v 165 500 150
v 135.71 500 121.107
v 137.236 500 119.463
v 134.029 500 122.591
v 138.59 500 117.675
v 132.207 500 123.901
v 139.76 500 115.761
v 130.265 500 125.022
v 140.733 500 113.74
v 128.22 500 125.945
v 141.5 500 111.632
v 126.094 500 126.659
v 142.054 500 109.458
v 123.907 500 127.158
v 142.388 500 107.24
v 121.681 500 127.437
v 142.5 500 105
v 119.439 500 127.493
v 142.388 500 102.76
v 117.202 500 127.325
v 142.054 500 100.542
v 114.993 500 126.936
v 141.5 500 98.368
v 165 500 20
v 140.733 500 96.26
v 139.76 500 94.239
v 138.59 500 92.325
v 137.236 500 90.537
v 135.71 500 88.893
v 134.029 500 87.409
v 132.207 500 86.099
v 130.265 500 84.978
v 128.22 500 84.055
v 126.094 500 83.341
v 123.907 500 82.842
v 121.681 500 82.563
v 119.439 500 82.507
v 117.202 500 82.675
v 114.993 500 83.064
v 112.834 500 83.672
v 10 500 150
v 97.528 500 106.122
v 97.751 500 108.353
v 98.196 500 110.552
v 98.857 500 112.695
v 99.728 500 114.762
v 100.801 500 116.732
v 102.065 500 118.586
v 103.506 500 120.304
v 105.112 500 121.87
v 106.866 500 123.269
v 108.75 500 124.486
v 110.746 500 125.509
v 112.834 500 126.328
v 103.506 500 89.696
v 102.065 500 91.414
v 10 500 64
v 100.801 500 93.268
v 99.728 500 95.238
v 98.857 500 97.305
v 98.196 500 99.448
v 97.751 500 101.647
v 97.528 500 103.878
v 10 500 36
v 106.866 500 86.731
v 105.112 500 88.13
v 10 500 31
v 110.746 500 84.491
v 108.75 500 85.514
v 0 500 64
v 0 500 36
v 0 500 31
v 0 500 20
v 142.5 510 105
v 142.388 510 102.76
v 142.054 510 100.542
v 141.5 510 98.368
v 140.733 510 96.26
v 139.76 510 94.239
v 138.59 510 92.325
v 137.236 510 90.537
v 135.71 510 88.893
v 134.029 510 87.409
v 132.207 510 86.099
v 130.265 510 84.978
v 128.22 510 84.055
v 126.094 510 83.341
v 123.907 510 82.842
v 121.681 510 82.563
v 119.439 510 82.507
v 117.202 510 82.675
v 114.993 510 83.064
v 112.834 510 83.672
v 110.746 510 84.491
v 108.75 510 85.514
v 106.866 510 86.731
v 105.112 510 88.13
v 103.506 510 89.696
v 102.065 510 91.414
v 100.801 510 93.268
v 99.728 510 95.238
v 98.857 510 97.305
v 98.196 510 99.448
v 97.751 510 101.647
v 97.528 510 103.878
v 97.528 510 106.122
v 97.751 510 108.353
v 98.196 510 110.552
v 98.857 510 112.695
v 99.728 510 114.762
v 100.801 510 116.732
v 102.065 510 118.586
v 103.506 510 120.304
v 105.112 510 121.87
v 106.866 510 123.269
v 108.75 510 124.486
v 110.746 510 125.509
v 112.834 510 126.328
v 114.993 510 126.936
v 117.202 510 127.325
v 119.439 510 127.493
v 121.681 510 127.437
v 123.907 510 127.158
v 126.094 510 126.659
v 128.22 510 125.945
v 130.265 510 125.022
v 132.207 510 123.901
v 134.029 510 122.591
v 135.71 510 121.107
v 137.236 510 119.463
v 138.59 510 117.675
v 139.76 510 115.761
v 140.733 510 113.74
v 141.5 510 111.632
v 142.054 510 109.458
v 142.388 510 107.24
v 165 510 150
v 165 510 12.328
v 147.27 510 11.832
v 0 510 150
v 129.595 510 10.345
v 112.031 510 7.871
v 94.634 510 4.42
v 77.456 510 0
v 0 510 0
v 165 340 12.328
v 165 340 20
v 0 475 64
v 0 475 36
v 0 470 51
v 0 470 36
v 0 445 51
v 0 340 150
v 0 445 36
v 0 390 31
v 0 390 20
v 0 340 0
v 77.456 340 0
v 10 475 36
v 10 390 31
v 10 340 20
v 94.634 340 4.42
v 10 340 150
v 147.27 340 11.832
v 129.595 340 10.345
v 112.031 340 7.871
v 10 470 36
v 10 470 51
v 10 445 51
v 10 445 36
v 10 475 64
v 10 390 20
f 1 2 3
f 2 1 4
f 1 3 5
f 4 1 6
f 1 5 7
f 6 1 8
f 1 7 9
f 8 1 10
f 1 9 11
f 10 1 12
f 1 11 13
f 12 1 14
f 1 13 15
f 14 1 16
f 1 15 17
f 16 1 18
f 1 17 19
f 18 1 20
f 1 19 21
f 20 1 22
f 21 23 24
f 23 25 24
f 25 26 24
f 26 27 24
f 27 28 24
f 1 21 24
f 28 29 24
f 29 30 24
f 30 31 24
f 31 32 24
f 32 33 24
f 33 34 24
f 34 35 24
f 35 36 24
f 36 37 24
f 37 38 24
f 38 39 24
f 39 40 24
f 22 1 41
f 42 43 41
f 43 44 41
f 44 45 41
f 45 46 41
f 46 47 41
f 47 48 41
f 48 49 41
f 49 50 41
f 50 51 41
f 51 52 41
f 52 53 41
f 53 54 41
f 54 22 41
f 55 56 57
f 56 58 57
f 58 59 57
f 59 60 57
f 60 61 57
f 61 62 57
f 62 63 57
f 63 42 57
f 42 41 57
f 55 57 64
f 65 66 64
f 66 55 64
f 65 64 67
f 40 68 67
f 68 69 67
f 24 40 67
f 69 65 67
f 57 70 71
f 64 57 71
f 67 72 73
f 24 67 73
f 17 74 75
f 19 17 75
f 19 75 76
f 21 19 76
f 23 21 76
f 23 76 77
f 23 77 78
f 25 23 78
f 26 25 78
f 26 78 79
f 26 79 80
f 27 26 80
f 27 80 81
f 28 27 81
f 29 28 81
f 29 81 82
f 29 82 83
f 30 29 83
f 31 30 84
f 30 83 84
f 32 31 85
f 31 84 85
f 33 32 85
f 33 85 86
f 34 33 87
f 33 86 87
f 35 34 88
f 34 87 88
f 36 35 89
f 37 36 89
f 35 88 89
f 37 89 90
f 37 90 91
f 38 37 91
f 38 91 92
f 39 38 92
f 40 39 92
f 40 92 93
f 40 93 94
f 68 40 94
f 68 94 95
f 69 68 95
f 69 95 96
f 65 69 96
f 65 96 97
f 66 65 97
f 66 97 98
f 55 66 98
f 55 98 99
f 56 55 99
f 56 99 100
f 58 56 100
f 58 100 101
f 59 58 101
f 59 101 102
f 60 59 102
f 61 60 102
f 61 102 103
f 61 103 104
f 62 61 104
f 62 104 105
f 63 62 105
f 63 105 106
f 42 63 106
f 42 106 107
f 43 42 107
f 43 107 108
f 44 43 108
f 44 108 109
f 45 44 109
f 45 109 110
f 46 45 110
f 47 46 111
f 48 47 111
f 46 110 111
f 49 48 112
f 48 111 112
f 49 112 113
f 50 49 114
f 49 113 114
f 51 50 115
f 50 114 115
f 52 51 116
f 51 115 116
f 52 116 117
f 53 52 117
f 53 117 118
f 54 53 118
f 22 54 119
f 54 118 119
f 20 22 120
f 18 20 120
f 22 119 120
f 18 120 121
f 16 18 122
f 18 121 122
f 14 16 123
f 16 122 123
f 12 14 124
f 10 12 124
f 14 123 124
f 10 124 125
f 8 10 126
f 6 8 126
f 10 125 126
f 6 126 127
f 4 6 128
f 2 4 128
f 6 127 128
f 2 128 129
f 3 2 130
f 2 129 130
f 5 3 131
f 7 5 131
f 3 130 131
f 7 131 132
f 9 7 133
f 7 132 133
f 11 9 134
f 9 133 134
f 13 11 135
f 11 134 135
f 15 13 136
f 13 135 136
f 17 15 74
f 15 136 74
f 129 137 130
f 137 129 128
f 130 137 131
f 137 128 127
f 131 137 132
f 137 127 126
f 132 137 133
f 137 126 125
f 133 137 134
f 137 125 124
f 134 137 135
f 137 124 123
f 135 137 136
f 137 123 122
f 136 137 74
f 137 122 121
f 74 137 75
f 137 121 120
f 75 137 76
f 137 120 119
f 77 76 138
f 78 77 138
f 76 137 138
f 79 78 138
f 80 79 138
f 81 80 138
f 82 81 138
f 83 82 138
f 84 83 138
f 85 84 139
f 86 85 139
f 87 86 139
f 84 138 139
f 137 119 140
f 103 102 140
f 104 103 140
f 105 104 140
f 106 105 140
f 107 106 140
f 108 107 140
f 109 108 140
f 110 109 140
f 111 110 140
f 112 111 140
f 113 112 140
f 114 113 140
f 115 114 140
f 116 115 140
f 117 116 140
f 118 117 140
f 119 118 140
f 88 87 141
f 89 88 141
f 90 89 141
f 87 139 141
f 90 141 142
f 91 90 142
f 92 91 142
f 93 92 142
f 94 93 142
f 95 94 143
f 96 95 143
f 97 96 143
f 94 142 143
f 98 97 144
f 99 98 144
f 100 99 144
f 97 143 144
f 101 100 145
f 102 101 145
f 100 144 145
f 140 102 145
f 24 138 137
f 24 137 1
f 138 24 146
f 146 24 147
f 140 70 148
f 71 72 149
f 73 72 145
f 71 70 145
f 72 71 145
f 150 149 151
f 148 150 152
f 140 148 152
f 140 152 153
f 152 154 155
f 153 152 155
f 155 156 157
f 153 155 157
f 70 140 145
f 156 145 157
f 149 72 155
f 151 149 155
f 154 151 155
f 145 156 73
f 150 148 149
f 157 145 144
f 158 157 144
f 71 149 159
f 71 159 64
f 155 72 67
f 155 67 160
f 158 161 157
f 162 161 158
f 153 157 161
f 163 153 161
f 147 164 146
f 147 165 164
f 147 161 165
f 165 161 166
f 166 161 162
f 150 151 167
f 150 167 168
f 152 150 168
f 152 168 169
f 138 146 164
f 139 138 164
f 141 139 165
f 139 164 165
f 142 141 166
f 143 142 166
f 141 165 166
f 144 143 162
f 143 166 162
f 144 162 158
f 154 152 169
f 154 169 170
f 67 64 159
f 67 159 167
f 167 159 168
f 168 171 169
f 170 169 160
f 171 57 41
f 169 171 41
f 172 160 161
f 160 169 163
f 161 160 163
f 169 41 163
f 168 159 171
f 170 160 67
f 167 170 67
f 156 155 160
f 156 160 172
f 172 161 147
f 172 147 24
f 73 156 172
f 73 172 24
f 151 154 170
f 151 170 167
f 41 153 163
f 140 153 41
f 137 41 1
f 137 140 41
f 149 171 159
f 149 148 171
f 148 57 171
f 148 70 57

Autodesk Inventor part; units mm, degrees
ref_plane "YZ Plane" through (0, 0, 0) normal (1, 0, 0) x (0, 1, 0)
ref_plane "XZ Plane" through (0, 0, 0) normal (0, 1, 0) x (-1, 0, 0)
ref_plane "XY Plane" through (0, 0, 0) normal (0, 0, 1) x (1, 0, 0)
sketch "Sketch1" plane through (0, 0, 0) normal (0, 0, 1) x (1, 0, 0)
  line L0 (0, 0) -> (330, 0)
  line L1 (330, 0) -> (330, 510)
  line L2 (330, 510) -> (0, 510)
  line L3 (0, 510) -> (0, 0)
  dimension "d0" = 330
  dimension "d1" = 510
extrude "Extrusion1" add sketch "Sketch1" along normal blind 150
sketch "Sketch2" plane through (0, 0, 0) normal (0, -1, 0) x (1, 0, 0)
  circle A0 centre (165, -304.672) radius 315
  line L0 (85, 0) -> (245, 0)
  line L1 (0, 0) -> (330, 0)
  circle A1 centre (165, -304.672) radius 317
  point P0 (165, 0)
  point P1 (165, 0)
  dimension "d4" = 630
  dimension "d8" = 160
  dimension "d9" = 2
extrude "Extrusion2" cut sketch "Sketch2" against normal through all
sketch "Sketch3" plane through (0, 0, 150) normal (0, 0, 1) x (1, 0, 0)
  line L0 (0, 0) -> (330, 0)
  line L1 (330, 0) -> (330, 510)
  line L2 (330, 510) -> (0, 510)
  line L3 (0, 510) -> (0, 0)
  line L4 (10, 10) -> (320, 10)
  line L5 (320, 10) -> (320, 500)
  line L6 (320, 500) -> (10, 500)
  line L7 (10, 500) -> (10, 10)
  dimension "d10" = 10
extrude "Extrusion3" cut sketch "Sketch3" against normal blind 130 contours L7 L6 L5 L4
sketch "Sketch4" plane through (0, 0, 20) normal (0, 0, 1) x (1, 0, 0)
  line L0 (10, 500) -> (320, 500) construction
  line L1 (85, 500) -> (245, 500) construction
  line L2 (245, 500) -> (245, 10) construction
  line L3 (245, 10) -> (85, 10) construction
  line L4 (85, 10) -> (85, 500) construction
  line L5 (320, 10) -> (10, 10) construction
  line L6 (85, 500) -> (245, 500) construction
  line L7 (245, 500) -> (245, 455) construction
  line L8 (245, 455) -> (85, 455) construction
  line L9 (85, 455) -> (85, 500) construction
  line L10 (85, 455) -> (245, 455) construction
  line L11 (245, 455) -> (245, 400) construction
  line L12 (245, 400) -> (85, 400) construction
  line L13 (85, 400) -> (85, 455) construction
  line L14 (85, 400) -> (245, 400) construction
  line L15 (245, 400) -> (245, 345) construction
  line L16 (245, 345) -> (85, 345) construction
  line L17 (85, 345) -> (85, 400) construction
  line L18 (85, 345) -> (245, 345) construction
  line L19 (245, 345) -> (245, 290) construction
  line L20 (245, 290) -> (85, 290) construction
  line L21 (85, 290) -> (85, 345) construction
  line L22 (85, 290) -> (245, 290) construction
  line L23 (245, 290) -> (245, 235) construction
  line L24 (245, 235) -> (85, 235) construction
  line L25 (85, 235) -> (85, 290) construction
  circle A0 centre (130.3559, 262.5) radius 15
  circle A1 centre (199.6441, 262.5) radius 15
  line L26 (130.3559, 262.5) -> (199.6441, 262.5) construction
  point P0 (0, 0)
  point P1 (165, 500)
  point P2 (165, 500)
  point P3 (165, 262.5)
  point P4 (165, 235)
  point P5 (245, 262.5)
  dimension "d13" = 160
  dimension "d14" = 45
  dimension "d15" = 55
  dimension "d16" = 55
  dimension "d17" = 55
  dimension "d18" = 55
  dimension "d19" = 30
  dimension "d20" = 30
  dimension "d21" = 69.2883
extrude "Extrusion4" cut sketch "Sketch4" against normal through all
sketch "Sketch5" plane through (0, 0, 150) normal (0, 0, 1) x (1, 0, 0)
  line L0 (330, 510) -> (0, 510)
  line L1 (0, 0) -> (330, 0)
  line L2 (330, 510) -> (165, 510)
  line L3 (165, 510) -> (165, 0)
  line L4 (165, 0) -> (330, 0)
  line L5 (330, 0) -> (330, 510)
  line L6 (0, 510) -> (0, 0)
  line L7 (330, 0) -> (0, 0)
  line L8 (0, 0) -> (0, 340)
  line L9 (0, 340) -> (330, 340)
  line L10 (330, 340) -> (330, 0)
  dimension "d24" = 340
extrude "Extrusion5" cut sketch "Sketch5" against normal through all contours L5 L9 L3 L0 | L5 L1 L3 L9 | L3 L1 L6 L9
sketch "Sketch7" plane through (0, 510, 0) normal (-1, 0, 0) x (0, 0, 1)
  line L0 (20, -10) -> (31, -10)
  line L1 (31, -10) -> (31, -120)
  line L2 (31, -120) -> (20, -120)
  line L3 (20, -120) -> (20, -10)
  line L4 (0, 0) -> (150, 0)
  line L5 (0, 0) -> (0, -170)
  line L6 (20, -170) -> (20, -10)
  line L7 (20, -170) -> (20, -10)
  point P0 (0, -510)
  dimension "d31" = 10
  dimension "d32" = 20
  dimension "d33" = 11
  dimension "d34" = 110
extrude "Extrusion7" cut sketch "Sketch7" against normal through all
sketch "Sketch8" plane through (0, 510, 0) normal (-1, 0, 0) x (0, 0, 1)
  line L0 (150, -10) -> (31, -10)
  line L1 (36, -10) -> (64, -10)
  line L2 (64, -10) -> (64, -35)
  line L3 (64, -35) -> (36, -35)
  line L4 (36, -35) -> (36, -10)
  line L5 (31, -120) -> (31, -10)
  point P0 (0, -510)
  dimension "d37" = 28
  dimension "d38" = 25
  dimension "d39" = 5
extrude "Extrusion8" cut sketch "Sketch8" against normal through all
sketch "Sketch9" plane through (0, 510, 0) normal (-1, 0, 0) x (0, 0, 1)
  line L0 (36, -40) -> (51, -40)
  line L1 (51, -40) -> (51, -65)
  line L2 (51, -65) -> (36, -65)
  line L3 (36, -65) -> (36, -40)
  line L4 (36, -35) -> (64, -35)
  point P0 (0, -510)
  dimension "d42" = 15
  dimension "d43" = 25
  dimension "d44" = 5
extrude "Extrusion9" cut sketch "Sketch9" against normal through all
sketch "Sketch10" plane through (0, 510, 150) normal (0, 1, 0) x (1, 0, 0)
  circle A0 centre (120, 45) radius 22.5
  line L0 (165, 0) -> (165, 137.672)
  line L1 (10, 0) -> (165, 0)
  point P0 (0, 150)
  dimension "d47" = 45
  dimension "d48" = 45
  dimension "d49" = 45
extrude "Extrusion10" cut sketch "Sketch10" against normal through all
properties part number "CA002" material "ABS Plastic"
